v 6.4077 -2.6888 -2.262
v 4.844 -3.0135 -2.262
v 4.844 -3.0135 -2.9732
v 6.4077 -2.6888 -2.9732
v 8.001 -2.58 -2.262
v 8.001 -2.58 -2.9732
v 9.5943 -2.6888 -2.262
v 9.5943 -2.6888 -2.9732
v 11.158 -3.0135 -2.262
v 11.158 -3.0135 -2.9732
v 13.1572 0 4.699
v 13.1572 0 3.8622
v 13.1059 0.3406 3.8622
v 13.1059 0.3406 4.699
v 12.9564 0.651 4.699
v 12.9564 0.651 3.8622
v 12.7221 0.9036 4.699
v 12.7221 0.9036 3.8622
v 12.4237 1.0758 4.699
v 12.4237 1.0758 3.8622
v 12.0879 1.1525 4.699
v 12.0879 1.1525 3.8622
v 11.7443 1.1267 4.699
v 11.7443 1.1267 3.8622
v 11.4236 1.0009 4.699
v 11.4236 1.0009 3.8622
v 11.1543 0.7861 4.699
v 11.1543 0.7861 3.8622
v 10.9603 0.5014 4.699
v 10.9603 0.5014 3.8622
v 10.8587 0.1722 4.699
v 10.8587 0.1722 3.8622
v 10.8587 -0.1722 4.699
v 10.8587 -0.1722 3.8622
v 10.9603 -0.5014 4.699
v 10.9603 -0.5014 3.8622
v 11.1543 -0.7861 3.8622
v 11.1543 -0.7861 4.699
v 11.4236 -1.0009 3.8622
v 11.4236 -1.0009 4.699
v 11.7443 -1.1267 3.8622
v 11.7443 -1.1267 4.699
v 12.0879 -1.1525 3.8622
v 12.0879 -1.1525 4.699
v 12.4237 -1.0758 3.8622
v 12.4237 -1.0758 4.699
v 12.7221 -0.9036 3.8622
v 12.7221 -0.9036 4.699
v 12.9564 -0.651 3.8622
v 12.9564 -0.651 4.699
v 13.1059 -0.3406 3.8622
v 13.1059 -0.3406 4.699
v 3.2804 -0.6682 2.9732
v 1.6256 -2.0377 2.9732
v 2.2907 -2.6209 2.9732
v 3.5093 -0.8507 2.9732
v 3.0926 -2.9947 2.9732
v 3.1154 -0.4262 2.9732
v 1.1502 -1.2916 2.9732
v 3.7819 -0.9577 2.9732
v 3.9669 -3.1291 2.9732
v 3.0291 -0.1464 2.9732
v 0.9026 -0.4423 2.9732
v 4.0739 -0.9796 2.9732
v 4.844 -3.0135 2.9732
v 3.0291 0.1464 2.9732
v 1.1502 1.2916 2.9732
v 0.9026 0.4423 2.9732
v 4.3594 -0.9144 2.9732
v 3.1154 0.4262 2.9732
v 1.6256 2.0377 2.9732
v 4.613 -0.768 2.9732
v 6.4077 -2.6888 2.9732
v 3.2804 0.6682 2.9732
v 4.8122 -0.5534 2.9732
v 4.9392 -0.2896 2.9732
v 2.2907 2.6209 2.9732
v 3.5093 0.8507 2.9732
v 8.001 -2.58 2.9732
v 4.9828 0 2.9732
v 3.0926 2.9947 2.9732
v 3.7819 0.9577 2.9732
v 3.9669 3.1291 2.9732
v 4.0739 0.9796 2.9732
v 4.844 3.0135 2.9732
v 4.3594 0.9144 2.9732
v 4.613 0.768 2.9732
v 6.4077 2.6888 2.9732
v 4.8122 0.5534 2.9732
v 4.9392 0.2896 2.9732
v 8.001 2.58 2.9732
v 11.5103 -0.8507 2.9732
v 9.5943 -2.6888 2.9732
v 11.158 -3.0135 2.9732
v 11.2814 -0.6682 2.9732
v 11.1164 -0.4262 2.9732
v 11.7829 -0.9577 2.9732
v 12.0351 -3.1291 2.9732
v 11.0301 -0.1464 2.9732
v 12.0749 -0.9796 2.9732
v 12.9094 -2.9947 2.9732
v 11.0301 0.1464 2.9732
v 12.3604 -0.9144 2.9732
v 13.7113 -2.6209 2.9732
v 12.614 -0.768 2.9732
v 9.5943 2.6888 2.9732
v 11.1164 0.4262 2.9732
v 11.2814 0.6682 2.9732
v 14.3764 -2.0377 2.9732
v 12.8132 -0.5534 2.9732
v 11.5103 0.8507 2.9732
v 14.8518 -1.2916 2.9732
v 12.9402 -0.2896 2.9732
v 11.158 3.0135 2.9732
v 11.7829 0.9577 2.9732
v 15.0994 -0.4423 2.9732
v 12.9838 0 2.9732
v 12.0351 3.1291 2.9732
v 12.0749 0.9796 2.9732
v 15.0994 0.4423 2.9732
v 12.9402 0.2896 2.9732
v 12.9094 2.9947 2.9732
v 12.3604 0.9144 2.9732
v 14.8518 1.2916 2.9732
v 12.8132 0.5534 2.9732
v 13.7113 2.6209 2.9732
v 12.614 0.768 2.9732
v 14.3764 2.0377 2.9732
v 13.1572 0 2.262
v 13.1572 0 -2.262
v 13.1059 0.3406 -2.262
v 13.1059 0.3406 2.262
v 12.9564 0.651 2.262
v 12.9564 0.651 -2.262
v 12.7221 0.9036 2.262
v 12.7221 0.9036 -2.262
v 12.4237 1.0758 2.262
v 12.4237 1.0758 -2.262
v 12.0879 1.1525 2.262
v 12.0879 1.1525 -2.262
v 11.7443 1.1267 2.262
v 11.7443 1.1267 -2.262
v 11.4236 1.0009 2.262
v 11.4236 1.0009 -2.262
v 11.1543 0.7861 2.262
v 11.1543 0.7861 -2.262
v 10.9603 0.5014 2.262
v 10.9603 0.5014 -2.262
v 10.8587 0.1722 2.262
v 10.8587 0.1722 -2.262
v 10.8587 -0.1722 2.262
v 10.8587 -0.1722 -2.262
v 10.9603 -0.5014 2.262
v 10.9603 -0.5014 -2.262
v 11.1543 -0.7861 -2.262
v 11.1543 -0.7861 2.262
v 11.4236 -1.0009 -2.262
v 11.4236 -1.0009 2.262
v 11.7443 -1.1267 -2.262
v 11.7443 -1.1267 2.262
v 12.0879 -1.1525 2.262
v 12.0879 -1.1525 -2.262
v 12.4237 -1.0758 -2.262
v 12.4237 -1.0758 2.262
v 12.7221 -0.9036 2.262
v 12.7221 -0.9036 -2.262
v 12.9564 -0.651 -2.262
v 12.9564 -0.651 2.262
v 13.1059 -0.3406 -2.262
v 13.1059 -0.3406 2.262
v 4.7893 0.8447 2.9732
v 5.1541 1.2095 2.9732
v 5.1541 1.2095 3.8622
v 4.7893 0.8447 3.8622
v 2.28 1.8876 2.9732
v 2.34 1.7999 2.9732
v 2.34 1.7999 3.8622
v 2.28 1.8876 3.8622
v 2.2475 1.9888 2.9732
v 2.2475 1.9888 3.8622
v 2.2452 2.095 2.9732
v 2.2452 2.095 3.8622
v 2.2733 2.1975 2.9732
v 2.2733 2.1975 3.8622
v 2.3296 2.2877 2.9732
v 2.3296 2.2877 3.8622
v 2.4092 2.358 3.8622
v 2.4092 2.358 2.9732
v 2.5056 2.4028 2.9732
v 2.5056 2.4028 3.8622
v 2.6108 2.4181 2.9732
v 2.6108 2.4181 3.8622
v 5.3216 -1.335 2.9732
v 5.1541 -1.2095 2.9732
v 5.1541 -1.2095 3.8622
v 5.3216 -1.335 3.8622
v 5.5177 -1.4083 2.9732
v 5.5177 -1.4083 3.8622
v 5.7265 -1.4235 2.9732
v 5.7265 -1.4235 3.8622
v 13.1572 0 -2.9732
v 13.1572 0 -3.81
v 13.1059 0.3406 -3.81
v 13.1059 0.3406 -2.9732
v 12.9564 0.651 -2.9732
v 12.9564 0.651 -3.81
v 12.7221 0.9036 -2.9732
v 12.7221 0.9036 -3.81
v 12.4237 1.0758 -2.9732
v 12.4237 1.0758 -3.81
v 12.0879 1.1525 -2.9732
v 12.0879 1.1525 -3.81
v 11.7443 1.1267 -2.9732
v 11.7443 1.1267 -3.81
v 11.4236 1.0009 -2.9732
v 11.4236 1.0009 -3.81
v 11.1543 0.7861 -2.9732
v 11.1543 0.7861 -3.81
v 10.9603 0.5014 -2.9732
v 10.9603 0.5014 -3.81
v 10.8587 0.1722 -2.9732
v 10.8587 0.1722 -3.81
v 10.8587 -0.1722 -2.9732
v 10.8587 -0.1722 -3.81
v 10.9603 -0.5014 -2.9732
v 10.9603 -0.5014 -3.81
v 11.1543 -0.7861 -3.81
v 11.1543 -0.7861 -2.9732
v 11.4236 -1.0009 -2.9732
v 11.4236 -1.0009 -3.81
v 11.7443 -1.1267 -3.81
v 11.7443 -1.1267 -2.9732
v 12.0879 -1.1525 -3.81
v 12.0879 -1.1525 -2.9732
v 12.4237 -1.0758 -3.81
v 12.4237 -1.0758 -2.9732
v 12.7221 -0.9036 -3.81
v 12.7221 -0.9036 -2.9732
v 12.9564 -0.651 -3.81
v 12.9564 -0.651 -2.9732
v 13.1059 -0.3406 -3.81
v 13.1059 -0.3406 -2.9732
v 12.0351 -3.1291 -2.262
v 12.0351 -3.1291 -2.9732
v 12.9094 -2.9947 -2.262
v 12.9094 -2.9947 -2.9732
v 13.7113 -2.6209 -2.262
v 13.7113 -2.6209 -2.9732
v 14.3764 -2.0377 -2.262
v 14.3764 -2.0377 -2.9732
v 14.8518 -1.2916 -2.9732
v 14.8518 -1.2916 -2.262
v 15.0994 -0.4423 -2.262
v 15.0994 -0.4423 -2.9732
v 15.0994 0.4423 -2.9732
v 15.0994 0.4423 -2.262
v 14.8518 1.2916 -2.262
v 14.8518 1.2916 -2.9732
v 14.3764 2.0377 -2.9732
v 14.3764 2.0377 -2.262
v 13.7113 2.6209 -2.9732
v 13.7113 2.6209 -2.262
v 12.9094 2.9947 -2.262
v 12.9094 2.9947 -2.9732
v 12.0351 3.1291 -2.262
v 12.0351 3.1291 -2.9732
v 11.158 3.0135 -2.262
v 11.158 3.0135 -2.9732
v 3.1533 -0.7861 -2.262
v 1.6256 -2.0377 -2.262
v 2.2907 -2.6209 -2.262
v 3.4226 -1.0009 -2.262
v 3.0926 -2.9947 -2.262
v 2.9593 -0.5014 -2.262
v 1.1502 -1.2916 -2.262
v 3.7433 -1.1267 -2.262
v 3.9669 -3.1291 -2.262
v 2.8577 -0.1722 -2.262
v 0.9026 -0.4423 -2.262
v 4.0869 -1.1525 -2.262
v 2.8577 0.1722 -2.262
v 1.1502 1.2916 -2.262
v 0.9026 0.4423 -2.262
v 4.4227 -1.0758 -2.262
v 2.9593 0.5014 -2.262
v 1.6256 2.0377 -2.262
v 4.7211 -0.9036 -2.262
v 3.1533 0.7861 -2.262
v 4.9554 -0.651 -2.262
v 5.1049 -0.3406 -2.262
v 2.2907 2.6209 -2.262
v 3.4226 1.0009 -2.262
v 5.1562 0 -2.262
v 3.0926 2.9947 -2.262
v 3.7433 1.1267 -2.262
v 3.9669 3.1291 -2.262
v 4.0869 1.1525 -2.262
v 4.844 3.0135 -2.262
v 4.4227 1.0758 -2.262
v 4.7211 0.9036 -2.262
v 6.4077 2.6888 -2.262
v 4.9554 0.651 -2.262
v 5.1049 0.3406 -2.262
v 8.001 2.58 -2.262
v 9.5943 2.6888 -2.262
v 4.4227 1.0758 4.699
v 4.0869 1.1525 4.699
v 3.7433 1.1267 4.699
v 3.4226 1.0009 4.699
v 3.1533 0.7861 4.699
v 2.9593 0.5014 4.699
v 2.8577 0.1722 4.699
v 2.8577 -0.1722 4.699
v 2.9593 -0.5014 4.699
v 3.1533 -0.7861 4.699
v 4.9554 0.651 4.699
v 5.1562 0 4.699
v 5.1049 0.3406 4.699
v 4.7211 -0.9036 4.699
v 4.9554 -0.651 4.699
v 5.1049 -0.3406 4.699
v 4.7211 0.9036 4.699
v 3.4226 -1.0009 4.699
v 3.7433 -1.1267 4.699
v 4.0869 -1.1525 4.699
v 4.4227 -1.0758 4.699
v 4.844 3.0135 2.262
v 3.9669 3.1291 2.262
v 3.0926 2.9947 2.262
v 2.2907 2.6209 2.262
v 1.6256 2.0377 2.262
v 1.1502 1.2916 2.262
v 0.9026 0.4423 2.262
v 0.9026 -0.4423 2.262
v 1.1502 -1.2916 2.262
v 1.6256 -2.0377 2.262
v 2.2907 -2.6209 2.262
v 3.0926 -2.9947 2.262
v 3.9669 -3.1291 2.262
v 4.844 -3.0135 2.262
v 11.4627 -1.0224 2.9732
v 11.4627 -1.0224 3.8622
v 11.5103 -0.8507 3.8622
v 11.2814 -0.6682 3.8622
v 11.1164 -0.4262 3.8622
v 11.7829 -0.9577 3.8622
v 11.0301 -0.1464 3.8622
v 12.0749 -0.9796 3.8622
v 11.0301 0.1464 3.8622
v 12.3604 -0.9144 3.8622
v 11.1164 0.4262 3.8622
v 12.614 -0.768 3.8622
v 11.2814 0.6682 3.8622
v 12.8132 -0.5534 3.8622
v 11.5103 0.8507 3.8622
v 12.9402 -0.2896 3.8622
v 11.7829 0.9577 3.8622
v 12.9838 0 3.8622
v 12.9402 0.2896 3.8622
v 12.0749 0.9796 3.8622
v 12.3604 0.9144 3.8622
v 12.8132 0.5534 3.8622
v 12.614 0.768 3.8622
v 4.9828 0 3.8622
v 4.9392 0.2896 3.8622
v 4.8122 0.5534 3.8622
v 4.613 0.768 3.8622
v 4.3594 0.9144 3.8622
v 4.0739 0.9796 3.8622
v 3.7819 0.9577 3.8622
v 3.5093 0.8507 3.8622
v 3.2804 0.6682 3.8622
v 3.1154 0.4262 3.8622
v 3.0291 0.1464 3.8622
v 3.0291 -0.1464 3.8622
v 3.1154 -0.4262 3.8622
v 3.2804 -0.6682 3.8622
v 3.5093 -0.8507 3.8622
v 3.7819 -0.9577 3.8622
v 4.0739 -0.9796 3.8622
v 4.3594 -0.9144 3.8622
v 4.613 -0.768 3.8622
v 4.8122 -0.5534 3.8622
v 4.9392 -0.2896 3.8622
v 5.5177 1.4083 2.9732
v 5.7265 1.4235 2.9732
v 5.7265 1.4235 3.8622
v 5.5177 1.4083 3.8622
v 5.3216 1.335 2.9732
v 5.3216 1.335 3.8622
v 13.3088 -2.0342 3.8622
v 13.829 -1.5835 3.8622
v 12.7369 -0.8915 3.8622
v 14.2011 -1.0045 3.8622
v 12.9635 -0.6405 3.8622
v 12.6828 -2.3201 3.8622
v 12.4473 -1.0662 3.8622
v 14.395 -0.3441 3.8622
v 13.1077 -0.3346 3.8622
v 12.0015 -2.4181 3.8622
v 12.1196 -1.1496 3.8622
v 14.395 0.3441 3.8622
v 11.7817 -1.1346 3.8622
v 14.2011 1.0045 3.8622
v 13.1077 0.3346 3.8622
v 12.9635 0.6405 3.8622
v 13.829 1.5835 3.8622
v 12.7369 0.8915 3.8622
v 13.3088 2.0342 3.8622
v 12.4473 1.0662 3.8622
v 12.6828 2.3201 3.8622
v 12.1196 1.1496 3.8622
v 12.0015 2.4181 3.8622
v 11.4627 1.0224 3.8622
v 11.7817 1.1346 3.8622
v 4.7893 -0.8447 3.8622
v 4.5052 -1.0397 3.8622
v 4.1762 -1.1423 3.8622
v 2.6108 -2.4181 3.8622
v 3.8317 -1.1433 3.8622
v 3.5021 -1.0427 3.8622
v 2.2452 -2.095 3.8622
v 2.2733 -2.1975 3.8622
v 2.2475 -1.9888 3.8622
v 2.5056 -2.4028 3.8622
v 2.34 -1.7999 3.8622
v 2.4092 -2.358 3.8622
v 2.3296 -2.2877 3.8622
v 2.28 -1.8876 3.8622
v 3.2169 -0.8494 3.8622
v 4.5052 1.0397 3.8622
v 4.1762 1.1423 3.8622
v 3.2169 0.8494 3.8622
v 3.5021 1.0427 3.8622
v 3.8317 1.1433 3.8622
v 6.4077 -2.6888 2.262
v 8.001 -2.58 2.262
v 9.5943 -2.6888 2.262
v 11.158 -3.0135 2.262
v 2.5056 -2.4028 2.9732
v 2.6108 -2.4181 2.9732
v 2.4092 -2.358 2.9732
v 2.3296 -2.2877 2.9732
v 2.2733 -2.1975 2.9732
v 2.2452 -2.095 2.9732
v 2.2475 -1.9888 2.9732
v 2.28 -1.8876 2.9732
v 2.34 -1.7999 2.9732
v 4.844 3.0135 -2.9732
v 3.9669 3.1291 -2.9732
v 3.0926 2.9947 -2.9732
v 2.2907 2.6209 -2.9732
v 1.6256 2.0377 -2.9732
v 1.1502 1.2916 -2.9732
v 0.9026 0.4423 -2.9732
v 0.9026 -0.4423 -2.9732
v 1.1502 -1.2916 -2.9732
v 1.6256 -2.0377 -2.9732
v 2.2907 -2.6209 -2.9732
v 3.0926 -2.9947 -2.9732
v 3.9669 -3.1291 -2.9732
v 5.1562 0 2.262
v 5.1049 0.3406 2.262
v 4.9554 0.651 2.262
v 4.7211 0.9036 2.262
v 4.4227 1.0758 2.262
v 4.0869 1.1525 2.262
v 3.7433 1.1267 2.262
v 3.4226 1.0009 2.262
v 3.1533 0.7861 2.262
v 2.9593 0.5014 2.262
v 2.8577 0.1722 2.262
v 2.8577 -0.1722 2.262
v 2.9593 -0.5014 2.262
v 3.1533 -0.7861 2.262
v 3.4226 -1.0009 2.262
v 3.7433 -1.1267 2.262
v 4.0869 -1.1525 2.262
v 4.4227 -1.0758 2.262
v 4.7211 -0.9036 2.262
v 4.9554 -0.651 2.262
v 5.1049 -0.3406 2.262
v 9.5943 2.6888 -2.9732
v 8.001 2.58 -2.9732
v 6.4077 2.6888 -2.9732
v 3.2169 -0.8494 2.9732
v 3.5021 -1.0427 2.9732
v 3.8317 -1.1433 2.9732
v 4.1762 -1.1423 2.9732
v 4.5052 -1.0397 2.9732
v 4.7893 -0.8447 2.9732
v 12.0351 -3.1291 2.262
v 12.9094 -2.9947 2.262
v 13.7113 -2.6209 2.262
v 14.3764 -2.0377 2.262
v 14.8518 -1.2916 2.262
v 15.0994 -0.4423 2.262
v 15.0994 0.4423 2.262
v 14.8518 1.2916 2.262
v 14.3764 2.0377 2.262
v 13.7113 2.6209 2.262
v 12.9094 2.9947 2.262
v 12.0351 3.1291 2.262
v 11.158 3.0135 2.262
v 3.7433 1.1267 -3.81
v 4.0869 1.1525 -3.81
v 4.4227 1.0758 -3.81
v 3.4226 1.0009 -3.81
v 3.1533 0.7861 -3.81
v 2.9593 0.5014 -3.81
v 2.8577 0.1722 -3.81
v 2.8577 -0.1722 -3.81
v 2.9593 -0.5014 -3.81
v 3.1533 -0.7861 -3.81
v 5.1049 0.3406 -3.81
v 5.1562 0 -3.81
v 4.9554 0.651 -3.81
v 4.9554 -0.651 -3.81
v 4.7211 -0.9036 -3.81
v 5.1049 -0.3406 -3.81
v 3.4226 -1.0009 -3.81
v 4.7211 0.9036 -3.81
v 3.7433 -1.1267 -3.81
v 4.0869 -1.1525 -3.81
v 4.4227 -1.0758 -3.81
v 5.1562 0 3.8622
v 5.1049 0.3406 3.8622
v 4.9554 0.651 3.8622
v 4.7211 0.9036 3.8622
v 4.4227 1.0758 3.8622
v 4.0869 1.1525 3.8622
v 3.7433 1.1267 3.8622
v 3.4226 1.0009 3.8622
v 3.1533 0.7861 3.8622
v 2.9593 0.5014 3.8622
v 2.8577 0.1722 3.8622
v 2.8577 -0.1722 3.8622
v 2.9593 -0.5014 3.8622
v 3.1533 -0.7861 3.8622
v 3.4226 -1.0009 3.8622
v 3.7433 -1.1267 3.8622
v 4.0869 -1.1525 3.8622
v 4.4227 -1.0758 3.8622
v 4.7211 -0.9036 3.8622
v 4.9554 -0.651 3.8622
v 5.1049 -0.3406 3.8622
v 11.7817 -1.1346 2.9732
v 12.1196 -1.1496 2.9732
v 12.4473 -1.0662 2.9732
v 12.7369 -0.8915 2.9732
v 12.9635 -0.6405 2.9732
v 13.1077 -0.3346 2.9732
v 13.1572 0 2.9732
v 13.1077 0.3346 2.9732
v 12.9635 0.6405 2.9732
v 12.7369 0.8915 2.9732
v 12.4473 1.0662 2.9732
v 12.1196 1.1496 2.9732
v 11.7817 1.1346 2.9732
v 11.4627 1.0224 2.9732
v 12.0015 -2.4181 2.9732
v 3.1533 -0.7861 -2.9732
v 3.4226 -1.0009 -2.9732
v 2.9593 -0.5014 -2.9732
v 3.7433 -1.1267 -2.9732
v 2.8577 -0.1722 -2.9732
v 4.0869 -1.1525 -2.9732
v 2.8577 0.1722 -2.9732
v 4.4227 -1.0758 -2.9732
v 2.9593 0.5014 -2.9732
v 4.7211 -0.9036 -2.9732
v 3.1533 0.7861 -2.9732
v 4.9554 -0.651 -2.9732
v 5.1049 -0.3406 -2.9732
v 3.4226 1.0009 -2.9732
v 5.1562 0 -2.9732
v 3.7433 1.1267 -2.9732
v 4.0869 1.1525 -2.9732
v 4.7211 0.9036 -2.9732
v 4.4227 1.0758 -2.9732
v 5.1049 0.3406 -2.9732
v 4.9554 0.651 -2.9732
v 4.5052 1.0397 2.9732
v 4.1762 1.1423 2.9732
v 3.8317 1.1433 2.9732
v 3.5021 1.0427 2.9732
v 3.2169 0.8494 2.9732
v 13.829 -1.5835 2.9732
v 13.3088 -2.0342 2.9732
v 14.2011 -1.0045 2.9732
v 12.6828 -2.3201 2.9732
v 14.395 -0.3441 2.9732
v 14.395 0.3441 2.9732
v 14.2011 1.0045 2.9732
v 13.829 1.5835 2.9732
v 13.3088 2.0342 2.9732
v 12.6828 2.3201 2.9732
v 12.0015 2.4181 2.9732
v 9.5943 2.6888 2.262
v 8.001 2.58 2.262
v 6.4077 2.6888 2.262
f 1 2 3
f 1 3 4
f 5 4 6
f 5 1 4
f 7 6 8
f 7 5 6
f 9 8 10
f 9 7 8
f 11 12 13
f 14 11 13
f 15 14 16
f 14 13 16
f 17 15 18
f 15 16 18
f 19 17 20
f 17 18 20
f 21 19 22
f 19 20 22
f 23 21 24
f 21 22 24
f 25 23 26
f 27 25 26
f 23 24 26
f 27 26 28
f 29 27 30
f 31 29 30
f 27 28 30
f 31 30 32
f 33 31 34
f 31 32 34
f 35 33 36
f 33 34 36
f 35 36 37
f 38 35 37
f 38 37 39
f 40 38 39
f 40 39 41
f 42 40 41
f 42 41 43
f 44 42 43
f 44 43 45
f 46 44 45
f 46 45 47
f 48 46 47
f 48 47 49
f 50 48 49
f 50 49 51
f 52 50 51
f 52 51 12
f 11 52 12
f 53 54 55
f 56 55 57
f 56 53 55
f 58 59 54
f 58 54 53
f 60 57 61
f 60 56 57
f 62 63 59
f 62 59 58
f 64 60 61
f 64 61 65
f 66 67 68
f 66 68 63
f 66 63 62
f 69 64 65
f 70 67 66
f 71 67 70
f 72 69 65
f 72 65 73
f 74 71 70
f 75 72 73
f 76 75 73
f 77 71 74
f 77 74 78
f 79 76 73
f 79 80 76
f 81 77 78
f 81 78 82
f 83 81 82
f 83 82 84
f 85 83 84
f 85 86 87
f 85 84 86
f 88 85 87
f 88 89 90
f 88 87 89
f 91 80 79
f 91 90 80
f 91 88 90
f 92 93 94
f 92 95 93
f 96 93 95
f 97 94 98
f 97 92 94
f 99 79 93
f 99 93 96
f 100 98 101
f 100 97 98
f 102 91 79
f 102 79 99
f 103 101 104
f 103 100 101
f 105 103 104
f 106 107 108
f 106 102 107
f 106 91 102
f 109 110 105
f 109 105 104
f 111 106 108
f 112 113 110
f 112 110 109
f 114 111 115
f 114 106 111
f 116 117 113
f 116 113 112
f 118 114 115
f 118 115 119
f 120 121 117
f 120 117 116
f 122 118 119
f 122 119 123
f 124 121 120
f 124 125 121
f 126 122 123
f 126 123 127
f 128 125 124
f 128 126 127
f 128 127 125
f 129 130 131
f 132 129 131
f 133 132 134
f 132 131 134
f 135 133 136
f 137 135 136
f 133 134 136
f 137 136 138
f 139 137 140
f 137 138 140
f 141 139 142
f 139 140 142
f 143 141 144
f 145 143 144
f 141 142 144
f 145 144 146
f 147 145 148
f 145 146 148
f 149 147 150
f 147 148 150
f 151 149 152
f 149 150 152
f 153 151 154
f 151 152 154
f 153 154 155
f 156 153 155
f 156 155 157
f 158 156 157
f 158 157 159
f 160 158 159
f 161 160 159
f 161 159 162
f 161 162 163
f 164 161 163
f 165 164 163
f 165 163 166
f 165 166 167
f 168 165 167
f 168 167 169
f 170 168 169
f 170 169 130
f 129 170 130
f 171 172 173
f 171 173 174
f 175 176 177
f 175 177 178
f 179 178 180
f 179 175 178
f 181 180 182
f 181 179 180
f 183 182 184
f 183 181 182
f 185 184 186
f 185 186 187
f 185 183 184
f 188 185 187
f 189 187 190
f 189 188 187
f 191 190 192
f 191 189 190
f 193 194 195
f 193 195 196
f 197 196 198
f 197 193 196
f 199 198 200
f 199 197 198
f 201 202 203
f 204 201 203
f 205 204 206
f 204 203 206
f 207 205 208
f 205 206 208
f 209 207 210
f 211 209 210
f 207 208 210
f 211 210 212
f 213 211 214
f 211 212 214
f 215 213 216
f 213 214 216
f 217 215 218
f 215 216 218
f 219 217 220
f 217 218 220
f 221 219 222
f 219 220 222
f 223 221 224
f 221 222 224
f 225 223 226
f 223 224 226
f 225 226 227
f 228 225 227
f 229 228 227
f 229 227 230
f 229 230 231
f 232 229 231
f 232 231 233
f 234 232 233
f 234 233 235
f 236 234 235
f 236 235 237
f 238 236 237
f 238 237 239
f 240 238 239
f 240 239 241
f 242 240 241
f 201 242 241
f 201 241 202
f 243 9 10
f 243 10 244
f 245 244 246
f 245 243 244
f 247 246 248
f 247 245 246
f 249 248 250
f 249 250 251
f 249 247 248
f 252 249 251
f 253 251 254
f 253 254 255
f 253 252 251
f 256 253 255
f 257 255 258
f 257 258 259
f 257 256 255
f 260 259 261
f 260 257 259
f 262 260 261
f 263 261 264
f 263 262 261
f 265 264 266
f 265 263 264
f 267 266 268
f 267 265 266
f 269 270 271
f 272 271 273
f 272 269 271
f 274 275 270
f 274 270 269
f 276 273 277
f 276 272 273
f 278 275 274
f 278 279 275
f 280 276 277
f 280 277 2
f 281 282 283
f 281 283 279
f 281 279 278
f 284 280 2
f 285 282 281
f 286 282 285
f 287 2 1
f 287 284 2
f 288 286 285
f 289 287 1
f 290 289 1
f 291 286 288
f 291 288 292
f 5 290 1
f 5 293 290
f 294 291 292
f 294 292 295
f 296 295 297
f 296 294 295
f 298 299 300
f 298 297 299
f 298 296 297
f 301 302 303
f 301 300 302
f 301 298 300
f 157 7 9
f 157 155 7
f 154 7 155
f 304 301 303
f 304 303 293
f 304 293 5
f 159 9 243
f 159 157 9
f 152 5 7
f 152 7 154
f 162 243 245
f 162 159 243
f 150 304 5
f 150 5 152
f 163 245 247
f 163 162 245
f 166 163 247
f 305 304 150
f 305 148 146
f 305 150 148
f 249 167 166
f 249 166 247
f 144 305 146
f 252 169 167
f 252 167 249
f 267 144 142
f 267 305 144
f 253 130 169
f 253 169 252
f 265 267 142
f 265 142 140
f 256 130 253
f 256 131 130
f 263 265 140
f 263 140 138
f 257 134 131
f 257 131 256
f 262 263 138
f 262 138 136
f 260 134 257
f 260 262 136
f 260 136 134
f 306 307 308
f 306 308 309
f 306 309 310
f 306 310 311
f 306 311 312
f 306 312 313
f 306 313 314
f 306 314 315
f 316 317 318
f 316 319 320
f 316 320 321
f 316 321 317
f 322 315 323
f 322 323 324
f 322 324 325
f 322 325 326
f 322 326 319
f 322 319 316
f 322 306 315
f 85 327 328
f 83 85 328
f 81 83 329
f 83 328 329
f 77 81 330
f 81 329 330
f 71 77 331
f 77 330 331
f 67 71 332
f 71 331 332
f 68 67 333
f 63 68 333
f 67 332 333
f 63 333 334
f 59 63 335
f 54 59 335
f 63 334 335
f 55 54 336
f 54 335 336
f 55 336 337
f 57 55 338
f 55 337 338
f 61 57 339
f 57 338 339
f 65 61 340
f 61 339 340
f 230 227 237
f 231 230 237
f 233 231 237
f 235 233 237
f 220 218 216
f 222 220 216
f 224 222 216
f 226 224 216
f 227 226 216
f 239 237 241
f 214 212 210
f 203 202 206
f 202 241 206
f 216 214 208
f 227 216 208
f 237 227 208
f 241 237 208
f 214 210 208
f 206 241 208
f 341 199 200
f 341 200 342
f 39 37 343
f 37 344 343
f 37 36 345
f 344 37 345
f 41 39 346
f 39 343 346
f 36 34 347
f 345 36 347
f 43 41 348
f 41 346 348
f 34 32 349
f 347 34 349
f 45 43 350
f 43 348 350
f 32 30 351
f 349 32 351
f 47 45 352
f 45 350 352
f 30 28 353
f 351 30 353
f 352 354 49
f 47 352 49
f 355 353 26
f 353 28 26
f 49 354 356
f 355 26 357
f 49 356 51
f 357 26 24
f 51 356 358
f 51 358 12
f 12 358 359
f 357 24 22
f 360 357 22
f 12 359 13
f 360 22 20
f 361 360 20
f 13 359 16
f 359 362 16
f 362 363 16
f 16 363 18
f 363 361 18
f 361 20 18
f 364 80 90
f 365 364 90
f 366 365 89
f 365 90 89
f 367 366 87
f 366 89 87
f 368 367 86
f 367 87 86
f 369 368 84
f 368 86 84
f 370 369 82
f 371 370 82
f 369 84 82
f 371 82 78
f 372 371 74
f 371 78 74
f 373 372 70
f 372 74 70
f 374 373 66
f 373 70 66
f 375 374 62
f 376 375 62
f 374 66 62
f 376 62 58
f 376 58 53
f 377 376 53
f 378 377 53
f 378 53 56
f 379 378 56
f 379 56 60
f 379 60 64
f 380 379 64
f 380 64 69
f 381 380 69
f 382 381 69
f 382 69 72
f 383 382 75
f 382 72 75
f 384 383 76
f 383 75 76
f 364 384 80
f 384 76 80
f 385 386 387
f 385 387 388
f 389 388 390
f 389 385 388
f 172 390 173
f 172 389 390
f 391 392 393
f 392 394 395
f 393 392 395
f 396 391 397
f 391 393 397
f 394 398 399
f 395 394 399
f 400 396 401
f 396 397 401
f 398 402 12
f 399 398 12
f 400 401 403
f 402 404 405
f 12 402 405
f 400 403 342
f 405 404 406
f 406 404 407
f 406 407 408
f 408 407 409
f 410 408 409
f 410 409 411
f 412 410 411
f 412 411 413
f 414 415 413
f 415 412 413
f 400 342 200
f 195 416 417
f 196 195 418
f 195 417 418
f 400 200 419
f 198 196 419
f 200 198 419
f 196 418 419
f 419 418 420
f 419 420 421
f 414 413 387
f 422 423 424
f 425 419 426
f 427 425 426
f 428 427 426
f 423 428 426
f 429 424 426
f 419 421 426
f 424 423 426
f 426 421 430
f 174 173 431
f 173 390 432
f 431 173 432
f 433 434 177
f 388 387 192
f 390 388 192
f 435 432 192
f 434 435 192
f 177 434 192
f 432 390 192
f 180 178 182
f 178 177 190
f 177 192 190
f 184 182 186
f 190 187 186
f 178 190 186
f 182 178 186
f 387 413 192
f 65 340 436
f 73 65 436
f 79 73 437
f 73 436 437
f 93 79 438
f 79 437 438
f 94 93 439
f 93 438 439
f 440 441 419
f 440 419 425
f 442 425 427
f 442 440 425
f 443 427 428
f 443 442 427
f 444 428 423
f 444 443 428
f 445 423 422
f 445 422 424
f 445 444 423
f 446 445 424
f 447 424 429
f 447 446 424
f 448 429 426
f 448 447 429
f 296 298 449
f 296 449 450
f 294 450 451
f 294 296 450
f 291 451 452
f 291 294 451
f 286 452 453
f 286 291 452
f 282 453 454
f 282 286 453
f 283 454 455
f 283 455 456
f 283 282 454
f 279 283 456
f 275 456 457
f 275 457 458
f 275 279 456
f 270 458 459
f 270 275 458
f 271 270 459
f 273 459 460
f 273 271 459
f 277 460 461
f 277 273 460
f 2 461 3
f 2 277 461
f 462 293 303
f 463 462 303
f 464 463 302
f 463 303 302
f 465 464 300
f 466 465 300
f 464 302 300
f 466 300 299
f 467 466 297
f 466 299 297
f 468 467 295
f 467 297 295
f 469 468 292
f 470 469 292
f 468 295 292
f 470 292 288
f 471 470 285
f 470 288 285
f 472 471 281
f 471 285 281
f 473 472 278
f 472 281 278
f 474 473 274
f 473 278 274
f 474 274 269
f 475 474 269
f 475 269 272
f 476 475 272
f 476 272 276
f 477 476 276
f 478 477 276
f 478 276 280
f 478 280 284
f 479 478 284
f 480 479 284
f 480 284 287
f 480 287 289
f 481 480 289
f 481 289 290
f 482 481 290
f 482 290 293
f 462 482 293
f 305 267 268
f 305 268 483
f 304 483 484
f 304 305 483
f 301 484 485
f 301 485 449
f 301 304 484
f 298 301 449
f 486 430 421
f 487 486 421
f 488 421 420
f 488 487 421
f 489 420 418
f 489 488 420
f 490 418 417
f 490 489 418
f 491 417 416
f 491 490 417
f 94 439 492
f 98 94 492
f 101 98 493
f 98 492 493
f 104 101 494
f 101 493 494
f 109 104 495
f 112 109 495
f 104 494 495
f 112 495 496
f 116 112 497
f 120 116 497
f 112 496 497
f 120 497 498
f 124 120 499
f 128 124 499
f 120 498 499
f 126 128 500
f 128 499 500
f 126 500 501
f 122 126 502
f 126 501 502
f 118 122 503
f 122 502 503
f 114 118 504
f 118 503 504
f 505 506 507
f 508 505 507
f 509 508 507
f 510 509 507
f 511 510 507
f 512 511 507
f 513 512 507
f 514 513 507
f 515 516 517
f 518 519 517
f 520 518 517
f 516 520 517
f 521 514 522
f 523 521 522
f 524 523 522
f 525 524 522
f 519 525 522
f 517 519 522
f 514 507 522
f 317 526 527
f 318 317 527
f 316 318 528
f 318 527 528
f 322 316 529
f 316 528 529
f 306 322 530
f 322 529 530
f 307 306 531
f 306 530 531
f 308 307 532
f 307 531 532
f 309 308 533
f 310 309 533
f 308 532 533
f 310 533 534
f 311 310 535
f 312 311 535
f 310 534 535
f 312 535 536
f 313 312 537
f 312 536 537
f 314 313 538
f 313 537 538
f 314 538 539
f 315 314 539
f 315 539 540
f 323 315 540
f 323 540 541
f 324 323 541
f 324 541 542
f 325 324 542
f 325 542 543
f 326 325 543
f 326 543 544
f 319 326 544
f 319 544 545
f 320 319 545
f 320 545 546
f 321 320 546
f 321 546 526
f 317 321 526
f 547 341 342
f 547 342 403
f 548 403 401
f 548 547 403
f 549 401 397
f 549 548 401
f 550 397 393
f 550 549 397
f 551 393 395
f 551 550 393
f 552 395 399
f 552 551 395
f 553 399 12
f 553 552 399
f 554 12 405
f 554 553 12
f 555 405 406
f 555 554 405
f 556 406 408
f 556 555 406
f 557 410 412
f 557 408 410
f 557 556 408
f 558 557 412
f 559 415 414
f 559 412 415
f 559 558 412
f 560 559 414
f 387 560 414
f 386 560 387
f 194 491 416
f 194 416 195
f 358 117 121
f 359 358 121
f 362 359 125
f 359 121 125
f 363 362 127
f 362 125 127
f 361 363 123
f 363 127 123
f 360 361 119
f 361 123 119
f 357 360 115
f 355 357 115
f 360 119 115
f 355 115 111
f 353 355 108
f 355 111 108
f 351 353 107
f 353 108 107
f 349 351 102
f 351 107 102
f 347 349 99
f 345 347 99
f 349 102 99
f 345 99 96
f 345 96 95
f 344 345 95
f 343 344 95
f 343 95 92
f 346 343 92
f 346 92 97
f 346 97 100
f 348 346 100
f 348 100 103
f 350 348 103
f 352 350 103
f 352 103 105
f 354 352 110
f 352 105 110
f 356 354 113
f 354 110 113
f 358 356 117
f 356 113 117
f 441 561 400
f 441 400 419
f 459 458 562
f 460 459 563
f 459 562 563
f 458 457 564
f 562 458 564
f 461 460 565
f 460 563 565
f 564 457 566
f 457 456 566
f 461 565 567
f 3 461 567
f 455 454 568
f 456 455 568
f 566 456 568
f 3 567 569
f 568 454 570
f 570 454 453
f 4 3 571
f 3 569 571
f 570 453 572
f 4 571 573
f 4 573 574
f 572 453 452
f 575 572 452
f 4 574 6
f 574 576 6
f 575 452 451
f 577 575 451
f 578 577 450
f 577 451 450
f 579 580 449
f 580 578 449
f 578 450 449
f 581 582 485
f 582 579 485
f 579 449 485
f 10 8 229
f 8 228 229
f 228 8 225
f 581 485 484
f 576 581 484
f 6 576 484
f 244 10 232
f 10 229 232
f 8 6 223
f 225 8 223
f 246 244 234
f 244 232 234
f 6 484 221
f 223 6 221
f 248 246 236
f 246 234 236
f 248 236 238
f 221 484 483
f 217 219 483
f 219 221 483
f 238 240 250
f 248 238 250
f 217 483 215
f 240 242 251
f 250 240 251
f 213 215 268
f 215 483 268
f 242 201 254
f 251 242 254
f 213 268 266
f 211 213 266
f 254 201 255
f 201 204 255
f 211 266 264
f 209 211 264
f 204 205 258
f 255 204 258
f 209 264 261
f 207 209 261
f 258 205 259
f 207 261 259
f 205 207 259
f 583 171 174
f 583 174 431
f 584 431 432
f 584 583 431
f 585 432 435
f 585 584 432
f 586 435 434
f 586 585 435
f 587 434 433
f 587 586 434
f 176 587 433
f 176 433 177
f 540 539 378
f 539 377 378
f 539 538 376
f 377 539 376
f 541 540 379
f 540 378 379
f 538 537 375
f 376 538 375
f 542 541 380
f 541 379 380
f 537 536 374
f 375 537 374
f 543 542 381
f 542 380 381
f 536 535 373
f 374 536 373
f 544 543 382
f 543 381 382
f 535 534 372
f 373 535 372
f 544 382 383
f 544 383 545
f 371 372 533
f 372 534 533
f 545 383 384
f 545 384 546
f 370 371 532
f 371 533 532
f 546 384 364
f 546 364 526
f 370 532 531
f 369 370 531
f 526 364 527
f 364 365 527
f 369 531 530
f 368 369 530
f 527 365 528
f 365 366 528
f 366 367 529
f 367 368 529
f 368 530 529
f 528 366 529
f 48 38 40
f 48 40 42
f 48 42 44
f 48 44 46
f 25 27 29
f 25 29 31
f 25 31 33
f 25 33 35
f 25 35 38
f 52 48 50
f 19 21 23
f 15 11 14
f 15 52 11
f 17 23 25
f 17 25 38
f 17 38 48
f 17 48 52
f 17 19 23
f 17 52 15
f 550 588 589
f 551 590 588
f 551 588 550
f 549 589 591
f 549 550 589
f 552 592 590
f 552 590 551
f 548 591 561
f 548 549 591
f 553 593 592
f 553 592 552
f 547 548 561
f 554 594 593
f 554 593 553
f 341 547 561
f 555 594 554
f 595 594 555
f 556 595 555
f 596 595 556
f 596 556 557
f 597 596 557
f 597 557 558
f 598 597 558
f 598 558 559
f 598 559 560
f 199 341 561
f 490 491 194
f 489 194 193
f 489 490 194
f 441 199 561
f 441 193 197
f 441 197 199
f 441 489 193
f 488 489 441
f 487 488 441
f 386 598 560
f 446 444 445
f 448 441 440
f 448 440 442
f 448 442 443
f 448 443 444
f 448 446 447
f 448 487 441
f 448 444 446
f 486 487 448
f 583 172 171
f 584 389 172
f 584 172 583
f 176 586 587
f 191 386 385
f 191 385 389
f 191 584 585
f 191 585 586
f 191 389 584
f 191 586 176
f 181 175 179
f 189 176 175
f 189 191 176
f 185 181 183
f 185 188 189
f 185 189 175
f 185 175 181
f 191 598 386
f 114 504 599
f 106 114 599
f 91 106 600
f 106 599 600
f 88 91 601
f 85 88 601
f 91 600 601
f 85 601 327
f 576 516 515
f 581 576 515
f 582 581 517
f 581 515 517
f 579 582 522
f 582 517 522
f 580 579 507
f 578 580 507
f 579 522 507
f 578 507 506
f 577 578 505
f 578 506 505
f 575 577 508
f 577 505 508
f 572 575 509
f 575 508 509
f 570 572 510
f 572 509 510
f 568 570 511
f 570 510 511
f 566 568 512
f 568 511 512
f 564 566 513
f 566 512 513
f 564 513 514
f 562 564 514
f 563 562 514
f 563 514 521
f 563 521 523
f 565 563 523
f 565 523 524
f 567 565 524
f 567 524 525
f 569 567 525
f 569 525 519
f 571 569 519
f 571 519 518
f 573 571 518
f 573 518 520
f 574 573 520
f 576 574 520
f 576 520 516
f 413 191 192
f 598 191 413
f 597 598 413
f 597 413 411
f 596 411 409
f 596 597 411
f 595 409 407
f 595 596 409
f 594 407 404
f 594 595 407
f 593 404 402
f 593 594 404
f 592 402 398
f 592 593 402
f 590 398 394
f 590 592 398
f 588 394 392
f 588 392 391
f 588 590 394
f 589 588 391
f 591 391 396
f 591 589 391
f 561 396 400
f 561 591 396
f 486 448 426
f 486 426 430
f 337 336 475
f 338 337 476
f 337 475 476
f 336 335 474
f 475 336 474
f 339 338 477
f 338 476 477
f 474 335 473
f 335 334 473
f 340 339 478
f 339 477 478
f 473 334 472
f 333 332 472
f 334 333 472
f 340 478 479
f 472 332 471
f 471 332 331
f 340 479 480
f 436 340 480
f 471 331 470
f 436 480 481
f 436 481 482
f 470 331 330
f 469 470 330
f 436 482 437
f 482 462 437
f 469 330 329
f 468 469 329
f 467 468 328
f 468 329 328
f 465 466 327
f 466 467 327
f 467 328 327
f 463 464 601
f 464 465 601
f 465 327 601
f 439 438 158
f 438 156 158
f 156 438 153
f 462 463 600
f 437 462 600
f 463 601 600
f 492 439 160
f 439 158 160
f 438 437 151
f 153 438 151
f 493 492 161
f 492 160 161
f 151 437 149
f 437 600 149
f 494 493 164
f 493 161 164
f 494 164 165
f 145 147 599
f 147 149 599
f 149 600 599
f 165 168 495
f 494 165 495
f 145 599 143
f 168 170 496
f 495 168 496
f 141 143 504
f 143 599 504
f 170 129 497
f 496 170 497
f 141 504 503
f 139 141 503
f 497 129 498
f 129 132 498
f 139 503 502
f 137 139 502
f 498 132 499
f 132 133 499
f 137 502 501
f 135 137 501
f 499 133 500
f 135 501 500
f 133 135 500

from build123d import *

# Parameters (mm, degrees)
SKETCH4_R                  = 2.5
SKETCH4_R_2                = 1.1811
BOSS_EXTRUDE1_DEPTH        = 1.5
SKETCH5_R                  = 1.1557
BOSS_EXTRUDE2_DEPTH        = 0.7112
LPATTERN1_COUNT            = 2
LPATTERN1_PITCH            = 8.001
SKETCH7_R                  = 1.1557
BOSS_EXTRUDE3_DEPTH        = 0.7112
MIRROR1_START              = 2.262
MIRROR1_OUTLINE_R          = 1.1557
MIRROR1_DEPTH              = 0.7112
BOSS_EXTRUDE4_DEPTH        = 4.699
BOSS_EXTRUDE4_DEPTH_BACK   = 3.81
SKETCH8_R                  = 1.1557
BOSS_EXTRUDE4_2_DEPTH      = 4.699
BOSS_EXTRUDE4_2_DEPTH_BACK = 3.81
BOSS_EXTRUDE5_DEPTH        = 0.889
SKETCH12_R                 = 1.1557
SKETCH12_R_2               = 0.982345
CUT_EXTRUDE1_DEPTH         = 0.889


# Read off the part's stored shape, not the designer's step: Mirror1
with BuildPart() as part:
    # Sketch4 → Boss-Extrude1 (new, symmetric)
    with BuildSketch(Plane.XY):
        with Locations((4.0005, 0)):
            Circle(SKETCH4_R)
        with Locations((4.0005, 0)):
            Circle(SKETCH4_R_2, mode=Mode.SUBTRACT)
    extrude(amount=BOSS_EXTRUDE1_DEPTH, both=True)


with BuildPart() as body_2:
    # Sketch5 → Boss-Extrude2 (new body)
    with BuildSketch(Plane.XY.offset(1.5)):
        with BuildLine():
            ThreePointArc((-3.068796943, 3.431772926), (-7.5565, 0), (-3.068796943, -3.431772926))
            ThreePointArc((-3.068796943, -3.431772926), (0, -3.0226), (3.068796943, -3.431772926))
            ThreePointArc((3.068796943, -3.431772926), (7.5565, 0), (3.068796943, 3.431772926))
            ThreePointArc((3.068796943, 3.431772926), (0, 3.0226), (-3.068796943, 3.431772926))
        make_face()
        with Locations((-4.0005, 0)):
            Circle(SKETCH5_R, mode=Mode.SUBTRACT)
        with Locations((4.0005, 0)):
            Circle(SKETCH5_R, mode=Mode.SUBTRACT)
    extrude(amount=BOSS_EXTRUDE2_DEPTH)


with BuildPart() as lpattern1_1:
    # LPattern1: pattern copy
    add(part.part.moved(Location(Vector(1, 0, 0) * (1 * LPATTERN1_PITCH))))


with BuildPart() as body_4:
    # Sketch7 → Boss-Extrude3 (new body)
    with BuildSketch(Plane.XY.offset(-2.262)):
        with BuildLine():
            ThreePointArc((4.843971698, 3.013461268), (0.87122, 0), (4.843971698, -3.013461268))
            ThreePointArc((4.843971698, -3.013461268), (8.001, -2.579963599), (11.158028302, -3.013461268))
            ThreePointArc((11.158028302, -3.013461268), (15.13078, 0), (11.158028302, 3.013461268))
            ThreePointArc((11.158028302, 3.013461268), (8.001, 2.579963599), (4.843971698, 3.013461268))
        make_face()
        with Locations((4.0005, 0)):
            Circle(SKETCH7_R, mode=Mode.SUBTRACT)
        with Locations((12.0015, 0)):
            Circle(SKETCH7_R, mode=Mode.SUBTRACT)
    extrude(amount=-BOSS_EXTRUDE3_DEPTH)


with BuildPart() as body_5:
    # Mirror1 outline → Mirror1 (new body)
    with BuildSketch(Plane.XY.offset(MIRROR1_START)):
        with BuildLine():
            ThreePointArc((11.158028302, -3.013461268), (15.13078, 0), (11.158028302, 3.013461268))
            ThreePointArc((11.158028302, 3.013461268), (8.001, 2.579963599), (4.843971698, 3.013461268))
            ThreePointArc((4.843971698, 3.013461268), (0.87122, 0), (4.843971698, -3.013461268))
            ThreePointArc((4.843971698, -3.013461268), (8.001, -2.579963599), (11.158028302, -3.013461268))
        make_face()
        with Locations((4.0005, 0)):
            Circle(MIRROR1_OUTLINE_R, mode=Mode.SUBTRACT)
        with Locations((12.0015, 0)):
            Circle(MIRROR1_OUTLINE_R, mode=Mode.SUBTRACT)
    extrude(amount=MIRROR1_DEPTH)


with BuildPart() as body_3:
    # Sketch8 → Boss-Extrude4 (new, two sides: drawn at the far end of the back side and taken through both)
    with BuildSketch(Plane.XY.offset(-BOSS_EXTRUDE4_DEPTH_BACK)):
        with Locations((4.0005, 0)):
            Circle(SKETCH8_R)
    extrude(amount=BOSS_EXTRUDE4_DEPTH + BOSS_EXTRUDE4_DEPTH_BACK)


with BuildPart() as body_4_2:
    # Sketch8 → Boss-Extrude4 2 (new, two sides: drawn at the far end of the back side and taken through both)
    with BuildSketch(Plane.XY.offset(-BOSS_EXTRUDE4_2_DEPTH_BACK)):
        with Locations((12.0015, 0)):
            Circle(SKETCH8_R)
    extrude(amount=BOSS_EXTRUDE4_2_DEPTH + BOSS_EXTRUDE4_2_DEPTH_BACK)


with BuildPart() as body_5_2:
    # Sketch10 → Boss-Extrude5 (new body)
    with BuildSketch(Plane.XY.offset(2.9732)):
        with BuildLine():
            Line((12.0015, -2.41808), (2.610756693, -2.41808))
            ThreePointArc((2.610756693, -2.41808), (2.273325514, -2.197496306), (2.339998478, -1.79991401))
            Line((2.339998478, -1.79991401), (3.33440236, -0.722021906))
            ThreePointArc((3.33440236, -0.722021906), (4.0005, -0.982345), (4.66659764, -0.722021906))
            Line((4.66659764, -0.722021906), (5.154115021, -1.209539288))
            ThreePointArc((5.154115021, -1.209539288), (5.417063777, -1.378673611), (5.726475822, -1.423536222))
            Line((5.726475822, -1.423536222), (12.070024923, -0.979952057))
            ThreePointArc((12.070024923, -0.979952057), (12.983845, 0), (12.070024923, 0.979952057))
            Line((12.070024923, 0.979952057), (5.726475822, 1.423536222))
            ThreePointArc((5.726475822, 1.423536222), (5.417063777, 1.378673611), (5.154115021, 1.209539288))
            Line((5.154115021, 1.209539288), (4.66659764, 0.722021906))
            ThreePointArc((4.66659764, 0.722021906), (4.0005, 0.982345), (3.33440236, 0.722021906))
            Line((3.33440236, 0.722021906), (2.339998478, 1.79991401))
            ThreePointArc((2.339998478, 1.79991401), (2.273325514, 2.197496306), (2.610756693, 2.41808))
            Line((2.610756693, 2.41808), (12.0015, 2.41808))
            ThreePointArc((12.0015, 2.41808), (14.41958, 0), (12.0015, -2.41808))
        make_face()
    extrude(amount=BOSS_EXTRUDE5_DEPTH)


with BuildPart() as cut_extrude1_tool:
    # Sketch12 → Cut-Extrude1 (new body)
    # profile 1 of 2: a face of its own
    with BuildSketch(Plane.XY.offset(2.9732)):
        with Locations((4.0005, 0)):
            Circle(SKETCH12_R)
        with Locations((4.0005, 0)):
            Circle(SKETCH12_R_2, mode=Mode.SUBTRACT)
    # profile 2 of 2: a face of its own
    with BuildSketch(Plane.XY.offset(2.9732)):
        with Locations((12.0015, 0)):
            Circle(SKETCH12_R)
        with Locations((12.0015, 0)):
            Circle(SKETCH12_R_2, mode=Mode.SUBTRACT)
    extrude(amount=CUT_EXTRUDE1_DEPTH)


with BuildPart() as body_3_1:
    add(body_3.part)

    # Cut-Extrude1: cut by cut_extrude1_tool
    add(cut_extrude1_tool.part, mode=Mode.SUBTRACT)


with BuildPart() as body_4_2_1:
    add(body_4_2.part)

    # Cut-Extrude1: cut by cut_extrude1_tool
    add(cut_extrude1_tool.part, mode=Mode.SUBTRACT)


with BuildPart() as body_5_2_1:
    add(body_5_2.part)

    # Cut-Extrude1: cut by cut_extrude1_tool
    add(cut_extrude1_tool.part, mode=Mode.SUBTRACT)


with BuildPart() as body_4_1:
    add(body_4.part)

    # Combine3: union body 5, body 4 2, body 3
    add(body_5.part)
    add(body_4_2_1.part)
    add(body_3_1.part)


solid = Compound([body_5_2_1.part, body_4_1.part])
